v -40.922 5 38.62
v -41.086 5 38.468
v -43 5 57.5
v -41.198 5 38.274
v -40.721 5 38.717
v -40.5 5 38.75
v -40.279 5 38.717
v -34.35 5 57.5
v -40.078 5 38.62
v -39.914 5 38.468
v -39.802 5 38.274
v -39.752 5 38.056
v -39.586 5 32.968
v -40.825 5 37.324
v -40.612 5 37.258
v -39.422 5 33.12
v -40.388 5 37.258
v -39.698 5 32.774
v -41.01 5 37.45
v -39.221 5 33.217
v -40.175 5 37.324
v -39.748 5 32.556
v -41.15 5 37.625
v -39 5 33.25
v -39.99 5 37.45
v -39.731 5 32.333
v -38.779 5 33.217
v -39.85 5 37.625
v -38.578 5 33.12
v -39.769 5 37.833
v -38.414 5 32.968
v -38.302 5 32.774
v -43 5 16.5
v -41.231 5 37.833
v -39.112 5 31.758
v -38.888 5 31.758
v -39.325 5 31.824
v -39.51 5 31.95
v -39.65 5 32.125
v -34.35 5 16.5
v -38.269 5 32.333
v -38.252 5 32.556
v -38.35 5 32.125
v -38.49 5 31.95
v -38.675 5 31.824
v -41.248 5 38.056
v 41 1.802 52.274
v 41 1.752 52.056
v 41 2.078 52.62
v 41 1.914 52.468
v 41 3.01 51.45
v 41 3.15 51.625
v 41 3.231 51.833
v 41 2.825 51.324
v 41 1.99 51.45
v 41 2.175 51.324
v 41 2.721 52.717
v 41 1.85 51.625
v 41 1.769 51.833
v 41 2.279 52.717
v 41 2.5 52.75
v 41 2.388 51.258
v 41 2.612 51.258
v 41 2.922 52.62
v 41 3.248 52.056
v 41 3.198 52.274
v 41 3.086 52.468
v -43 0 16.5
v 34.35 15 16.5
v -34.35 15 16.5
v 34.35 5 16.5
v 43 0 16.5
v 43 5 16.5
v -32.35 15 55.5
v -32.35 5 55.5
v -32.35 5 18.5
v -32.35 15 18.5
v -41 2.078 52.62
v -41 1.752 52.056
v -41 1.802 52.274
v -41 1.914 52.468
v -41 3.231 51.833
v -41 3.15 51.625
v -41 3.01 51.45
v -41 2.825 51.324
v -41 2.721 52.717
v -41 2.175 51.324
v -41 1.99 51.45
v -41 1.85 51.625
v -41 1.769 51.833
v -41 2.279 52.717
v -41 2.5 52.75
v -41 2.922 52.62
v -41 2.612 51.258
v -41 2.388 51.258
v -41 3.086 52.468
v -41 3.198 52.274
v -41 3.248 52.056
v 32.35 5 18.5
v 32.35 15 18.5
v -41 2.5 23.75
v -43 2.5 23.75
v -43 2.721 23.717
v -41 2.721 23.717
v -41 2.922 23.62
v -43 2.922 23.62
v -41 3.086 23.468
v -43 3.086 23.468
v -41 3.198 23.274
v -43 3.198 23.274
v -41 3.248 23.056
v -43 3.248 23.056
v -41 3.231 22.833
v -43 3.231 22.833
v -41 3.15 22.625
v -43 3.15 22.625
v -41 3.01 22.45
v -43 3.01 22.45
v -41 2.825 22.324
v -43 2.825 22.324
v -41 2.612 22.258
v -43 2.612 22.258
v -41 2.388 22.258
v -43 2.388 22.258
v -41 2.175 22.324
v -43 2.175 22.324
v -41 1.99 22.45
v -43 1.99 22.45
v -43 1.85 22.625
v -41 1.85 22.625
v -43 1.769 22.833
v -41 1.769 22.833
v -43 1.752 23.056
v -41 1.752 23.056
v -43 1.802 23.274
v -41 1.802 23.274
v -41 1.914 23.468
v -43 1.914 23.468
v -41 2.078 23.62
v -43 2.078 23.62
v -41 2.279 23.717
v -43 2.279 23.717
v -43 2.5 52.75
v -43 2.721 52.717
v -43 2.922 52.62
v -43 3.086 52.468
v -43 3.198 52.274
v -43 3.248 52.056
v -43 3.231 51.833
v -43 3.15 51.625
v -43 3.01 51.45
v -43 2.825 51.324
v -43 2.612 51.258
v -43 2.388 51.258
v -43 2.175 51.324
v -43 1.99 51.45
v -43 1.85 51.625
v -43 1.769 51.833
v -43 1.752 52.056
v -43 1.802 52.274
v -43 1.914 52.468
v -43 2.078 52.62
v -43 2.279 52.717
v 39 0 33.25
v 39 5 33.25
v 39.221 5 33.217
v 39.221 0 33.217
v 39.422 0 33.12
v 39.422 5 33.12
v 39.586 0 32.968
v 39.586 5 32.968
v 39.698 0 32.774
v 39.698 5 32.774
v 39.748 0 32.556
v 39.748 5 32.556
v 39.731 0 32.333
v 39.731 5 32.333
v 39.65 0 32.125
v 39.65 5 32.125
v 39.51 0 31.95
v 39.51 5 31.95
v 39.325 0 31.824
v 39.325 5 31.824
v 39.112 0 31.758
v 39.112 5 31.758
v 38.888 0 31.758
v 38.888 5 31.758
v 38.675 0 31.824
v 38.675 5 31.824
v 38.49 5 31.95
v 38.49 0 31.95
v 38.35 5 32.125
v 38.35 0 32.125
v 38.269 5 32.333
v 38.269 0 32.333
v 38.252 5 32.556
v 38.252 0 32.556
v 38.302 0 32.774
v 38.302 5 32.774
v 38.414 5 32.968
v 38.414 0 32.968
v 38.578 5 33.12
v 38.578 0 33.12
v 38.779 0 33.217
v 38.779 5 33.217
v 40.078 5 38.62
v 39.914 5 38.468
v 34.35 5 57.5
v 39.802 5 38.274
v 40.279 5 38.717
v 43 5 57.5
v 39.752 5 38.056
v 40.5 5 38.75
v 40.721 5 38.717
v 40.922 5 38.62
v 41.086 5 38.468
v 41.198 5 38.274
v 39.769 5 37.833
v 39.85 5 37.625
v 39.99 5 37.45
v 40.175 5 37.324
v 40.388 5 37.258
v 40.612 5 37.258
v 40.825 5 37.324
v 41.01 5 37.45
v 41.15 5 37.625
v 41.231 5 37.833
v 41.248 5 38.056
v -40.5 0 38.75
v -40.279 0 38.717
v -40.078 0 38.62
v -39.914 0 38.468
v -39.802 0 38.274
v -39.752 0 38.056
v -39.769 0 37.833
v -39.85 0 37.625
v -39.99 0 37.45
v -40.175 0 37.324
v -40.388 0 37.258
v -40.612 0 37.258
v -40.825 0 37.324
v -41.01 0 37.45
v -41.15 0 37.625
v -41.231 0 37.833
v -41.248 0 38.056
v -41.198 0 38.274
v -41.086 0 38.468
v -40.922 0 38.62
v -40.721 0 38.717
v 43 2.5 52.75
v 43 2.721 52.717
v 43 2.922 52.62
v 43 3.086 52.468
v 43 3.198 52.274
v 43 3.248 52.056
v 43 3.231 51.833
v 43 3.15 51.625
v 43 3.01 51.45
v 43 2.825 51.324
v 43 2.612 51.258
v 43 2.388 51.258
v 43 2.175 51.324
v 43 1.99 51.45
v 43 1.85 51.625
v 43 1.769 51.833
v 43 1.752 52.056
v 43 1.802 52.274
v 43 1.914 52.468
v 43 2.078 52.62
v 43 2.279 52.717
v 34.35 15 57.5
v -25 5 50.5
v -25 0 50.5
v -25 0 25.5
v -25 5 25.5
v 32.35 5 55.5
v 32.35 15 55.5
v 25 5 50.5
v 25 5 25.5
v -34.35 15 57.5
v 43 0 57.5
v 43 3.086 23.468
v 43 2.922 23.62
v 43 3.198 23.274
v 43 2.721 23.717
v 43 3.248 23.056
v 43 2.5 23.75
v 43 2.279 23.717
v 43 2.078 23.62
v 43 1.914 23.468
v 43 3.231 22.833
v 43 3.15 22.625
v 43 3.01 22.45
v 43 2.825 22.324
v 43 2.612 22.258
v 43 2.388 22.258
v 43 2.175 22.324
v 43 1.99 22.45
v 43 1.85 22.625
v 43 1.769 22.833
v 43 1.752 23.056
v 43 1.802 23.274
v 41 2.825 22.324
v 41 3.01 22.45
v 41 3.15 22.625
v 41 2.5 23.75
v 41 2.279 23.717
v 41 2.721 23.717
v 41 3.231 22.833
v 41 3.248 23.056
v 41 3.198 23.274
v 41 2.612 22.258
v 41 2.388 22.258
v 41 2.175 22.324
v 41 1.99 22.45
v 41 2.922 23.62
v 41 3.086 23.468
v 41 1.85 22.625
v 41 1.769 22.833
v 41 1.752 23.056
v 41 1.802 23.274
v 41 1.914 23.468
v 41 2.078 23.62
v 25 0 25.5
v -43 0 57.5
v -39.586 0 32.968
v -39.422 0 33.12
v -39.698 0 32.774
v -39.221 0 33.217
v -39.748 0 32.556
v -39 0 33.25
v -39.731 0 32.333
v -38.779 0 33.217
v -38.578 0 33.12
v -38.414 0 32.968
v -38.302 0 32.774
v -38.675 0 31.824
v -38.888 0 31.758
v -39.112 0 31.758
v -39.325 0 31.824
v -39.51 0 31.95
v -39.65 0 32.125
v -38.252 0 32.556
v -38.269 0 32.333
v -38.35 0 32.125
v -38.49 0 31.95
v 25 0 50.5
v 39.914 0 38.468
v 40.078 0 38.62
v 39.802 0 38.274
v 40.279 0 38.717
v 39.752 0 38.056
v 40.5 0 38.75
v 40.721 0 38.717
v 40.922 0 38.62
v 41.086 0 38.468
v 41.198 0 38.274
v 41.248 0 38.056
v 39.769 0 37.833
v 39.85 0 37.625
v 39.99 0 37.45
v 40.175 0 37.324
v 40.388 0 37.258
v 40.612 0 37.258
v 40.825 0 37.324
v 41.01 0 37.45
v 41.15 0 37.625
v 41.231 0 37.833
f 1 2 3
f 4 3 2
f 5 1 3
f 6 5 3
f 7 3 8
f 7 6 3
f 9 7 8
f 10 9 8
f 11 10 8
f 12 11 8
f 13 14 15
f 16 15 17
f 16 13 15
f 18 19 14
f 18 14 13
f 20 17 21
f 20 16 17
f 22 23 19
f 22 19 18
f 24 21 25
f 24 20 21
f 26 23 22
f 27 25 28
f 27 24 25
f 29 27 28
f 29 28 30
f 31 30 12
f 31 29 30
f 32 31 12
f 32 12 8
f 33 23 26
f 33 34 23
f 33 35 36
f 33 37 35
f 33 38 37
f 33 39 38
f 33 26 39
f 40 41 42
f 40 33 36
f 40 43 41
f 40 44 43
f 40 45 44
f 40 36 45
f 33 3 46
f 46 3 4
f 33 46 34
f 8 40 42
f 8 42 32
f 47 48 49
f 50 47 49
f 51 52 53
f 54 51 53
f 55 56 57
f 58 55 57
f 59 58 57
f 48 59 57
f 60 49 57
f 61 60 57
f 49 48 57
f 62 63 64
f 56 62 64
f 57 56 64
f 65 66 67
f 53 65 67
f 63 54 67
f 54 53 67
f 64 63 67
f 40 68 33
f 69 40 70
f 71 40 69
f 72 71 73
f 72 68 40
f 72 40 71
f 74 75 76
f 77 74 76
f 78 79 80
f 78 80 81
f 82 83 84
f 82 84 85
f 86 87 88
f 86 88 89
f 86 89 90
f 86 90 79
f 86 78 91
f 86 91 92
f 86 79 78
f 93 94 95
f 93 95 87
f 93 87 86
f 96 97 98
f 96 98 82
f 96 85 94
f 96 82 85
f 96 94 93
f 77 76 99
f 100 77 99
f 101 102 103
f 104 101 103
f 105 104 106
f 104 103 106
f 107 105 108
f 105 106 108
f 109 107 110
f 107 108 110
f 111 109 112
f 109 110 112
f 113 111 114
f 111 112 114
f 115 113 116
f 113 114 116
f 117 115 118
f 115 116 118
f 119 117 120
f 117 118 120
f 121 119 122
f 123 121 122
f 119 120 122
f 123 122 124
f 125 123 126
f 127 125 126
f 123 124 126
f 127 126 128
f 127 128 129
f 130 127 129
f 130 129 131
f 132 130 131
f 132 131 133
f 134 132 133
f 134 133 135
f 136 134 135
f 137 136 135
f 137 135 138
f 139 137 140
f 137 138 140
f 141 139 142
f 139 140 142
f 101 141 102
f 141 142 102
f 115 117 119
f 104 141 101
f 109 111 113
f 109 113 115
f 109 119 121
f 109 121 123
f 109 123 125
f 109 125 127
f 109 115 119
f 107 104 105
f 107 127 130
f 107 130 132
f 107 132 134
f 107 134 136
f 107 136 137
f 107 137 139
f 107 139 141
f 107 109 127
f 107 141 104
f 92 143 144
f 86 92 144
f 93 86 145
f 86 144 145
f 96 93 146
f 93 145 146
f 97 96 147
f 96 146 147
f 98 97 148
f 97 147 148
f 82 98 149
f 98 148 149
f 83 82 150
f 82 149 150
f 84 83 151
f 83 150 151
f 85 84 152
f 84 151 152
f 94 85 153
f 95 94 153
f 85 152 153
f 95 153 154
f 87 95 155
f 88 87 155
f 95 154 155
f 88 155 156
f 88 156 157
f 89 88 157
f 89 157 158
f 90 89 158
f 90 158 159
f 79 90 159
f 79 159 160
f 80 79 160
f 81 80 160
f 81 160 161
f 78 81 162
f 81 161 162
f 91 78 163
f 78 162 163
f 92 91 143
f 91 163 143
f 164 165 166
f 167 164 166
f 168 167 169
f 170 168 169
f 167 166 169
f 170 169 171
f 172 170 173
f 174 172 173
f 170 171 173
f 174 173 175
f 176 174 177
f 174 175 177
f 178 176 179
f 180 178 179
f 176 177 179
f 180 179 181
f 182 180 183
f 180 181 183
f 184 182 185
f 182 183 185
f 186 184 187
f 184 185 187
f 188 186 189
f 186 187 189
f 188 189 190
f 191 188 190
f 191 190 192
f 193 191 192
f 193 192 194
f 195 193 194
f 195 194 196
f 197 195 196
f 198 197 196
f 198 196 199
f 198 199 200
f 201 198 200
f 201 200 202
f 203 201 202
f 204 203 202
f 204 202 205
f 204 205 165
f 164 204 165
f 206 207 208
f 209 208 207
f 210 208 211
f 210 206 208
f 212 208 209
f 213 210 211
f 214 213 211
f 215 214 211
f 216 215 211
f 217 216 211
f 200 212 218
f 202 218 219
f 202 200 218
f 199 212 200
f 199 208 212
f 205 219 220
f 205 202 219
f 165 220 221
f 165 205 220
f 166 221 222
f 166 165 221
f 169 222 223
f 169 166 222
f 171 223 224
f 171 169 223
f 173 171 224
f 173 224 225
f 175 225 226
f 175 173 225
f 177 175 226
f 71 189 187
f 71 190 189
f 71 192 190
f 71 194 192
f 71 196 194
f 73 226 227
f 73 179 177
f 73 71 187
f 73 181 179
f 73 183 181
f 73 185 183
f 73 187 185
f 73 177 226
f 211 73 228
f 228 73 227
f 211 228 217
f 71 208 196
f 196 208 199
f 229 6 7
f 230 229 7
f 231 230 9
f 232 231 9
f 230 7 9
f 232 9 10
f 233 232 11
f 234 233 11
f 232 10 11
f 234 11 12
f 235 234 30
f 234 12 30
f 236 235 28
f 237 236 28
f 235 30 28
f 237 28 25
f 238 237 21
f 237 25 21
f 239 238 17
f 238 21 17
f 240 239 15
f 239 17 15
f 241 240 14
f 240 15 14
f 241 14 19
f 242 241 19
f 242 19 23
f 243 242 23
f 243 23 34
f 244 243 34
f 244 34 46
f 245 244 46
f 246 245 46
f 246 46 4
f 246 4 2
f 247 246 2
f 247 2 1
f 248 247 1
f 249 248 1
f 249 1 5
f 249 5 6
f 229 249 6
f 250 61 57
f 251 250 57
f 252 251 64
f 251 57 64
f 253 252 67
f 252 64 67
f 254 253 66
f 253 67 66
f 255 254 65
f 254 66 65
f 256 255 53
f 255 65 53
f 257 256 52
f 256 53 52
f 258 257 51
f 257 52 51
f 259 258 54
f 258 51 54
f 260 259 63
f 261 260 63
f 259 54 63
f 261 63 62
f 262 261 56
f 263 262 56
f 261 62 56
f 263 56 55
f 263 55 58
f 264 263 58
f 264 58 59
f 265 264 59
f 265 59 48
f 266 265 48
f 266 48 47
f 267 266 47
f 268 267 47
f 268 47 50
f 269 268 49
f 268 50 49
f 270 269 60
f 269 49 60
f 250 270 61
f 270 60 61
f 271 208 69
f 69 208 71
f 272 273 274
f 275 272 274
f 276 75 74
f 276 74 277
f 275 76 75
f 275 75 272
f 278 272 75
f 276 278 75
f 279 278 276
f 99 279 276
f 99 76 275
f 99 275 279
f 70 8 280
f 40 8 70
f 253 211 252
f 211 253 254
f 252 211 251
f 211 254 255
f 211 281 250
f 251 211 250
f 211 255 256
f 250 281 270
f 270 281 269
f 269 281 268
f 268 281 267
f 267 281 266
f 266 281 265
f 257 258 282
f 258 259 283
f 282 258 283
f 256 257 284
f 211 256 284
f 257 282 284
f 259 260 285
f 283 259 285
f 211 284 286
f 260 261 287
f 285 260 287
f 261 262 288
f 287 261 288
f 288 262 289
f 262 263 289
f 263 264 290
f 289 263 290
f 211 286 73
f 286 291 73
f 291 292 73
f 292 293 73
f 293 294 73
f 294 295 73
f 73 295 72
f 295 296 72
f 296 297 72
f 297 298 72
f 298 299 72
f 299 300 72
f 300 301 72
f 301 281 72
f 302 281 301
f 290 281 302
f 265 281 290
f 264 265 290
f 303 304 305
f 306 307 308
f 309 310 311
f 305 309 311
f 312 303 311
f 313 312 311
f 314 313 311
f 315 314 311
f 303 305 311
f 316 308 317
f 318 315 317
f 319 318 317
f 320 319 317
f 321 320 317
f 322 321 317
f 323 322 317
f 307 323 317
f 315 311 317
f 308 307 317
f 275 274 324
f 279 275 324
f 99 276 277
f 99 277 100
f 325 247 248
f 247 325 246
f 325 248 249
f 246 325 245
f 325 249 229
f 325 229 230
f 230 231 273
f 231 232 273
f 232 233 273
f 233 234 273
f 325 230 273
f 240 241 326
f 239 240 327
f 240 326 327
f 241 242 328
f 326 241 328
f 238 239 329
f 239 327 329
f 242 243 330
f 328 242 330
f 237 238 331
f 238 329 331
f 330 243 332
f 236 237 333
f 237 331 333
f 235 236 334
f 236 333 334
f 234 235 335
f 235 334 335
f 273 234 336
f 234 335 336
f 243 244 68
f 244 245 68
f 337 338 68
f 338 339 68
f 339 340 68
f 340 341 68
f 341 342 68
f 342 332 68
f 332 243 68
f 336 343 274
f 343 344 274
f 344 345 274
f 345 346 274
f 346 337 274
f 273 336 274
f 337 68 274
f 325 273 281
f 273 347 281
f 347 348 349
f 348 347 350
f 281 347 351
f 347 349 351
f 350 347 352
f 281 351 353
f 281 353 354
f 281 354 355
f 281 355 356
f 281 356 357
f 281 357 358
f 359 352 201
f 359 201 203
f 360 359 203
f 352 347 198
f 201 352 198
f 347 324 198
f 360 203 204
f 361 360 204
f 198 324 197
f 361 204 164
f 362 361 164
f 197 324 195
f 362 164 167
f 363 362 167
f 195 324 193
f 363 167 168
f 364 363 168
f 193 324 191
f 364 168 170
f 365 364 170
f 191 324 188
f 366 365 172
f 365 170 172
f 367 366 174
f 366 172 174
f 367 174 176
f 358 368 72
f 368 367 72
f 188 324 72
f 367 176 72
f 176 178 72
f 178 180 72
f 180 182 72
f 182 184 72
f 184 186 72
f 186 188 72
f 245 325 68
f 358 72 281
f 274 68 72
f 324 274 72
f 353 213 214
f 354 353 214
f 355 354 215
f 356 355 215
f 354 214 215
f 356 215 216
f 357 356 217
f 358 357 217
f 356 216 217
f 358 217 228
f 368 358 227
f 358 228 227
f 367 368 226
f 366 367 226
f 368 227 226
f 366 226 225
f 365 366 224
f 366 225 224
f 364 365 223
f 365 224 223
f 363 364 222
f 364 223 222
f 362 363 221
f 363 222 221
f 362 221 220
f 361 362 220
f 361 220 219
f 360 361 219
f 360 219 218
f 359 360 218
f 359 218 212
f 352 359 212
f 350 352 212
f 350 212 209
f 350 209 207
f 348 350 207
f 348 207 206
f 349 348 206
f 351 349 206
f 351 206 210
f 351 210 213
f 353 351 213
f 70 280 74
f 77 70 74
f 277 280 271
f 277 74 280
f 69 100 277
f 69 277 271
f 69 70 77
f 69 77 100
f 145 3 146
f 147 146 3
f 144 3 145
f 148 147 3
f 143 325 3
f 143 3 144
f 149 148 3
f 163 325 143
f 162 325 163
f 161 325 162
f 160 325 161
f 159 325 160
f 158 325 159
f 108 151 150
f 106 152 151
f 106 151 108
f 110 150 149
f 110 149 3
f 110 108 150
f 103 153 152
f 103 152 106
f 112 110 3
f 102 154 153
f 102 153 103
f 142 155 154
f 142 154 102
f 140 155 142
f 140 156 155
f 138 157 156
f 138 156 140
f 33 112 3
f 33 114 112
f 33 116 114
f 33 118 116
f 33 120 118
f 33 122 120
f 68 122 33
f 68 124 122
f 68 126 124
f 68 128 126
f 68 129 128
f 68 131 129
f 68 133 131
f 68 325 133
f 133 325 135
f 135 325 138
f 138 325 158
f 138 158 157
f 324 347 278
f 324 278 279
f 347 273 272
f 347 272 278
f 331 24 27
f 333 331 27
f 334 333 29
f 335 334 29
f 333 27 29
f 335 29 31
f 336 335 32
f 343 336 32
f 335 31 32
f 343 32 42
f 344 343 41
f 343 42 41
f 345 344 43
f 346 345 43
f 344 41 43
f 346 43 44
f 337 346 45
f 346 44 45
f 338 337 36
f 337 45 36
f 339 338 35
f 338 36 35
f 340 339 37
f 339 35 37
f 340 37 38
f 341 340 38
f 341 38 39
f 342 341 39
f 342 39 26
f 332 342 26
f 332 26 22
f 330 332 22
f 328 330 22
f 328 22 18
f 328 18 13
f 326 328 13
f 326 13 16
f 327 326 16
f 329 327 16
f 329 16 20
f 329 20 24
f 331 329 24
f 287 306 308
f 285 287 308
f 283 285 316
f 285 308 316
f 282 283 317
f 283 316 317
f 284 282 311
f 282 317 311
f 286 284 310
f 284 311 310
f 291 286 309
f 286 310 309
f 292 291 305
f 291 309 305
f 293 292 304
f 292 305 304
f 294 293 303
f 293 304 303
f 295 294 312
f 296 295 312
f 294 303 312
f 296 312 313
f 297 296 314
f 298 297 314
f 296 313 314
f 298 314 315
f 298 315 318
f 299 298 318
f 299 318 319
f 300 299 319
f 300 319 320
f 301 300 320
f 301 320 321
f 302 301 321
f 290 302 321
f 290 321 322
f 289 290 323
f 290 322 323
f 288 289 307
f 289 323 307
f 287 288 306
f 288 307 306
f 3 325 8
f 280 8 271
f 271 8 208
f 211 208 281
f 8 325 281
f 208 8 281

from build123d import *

# Parameters (mm, degrees)
SKETCH_1_W          = 86
SKETCH_1_H          = 174
SKETCH_1_W_2        = 50
SKETCH_1_H_2        = 25
SKETCH_1_H_3        = 55
SKETCH_1_W_3        = 76
SKETCH_1_H_4        = 43
EXTRUDE_1_DEPTH     = 5
SKETCH_4_W          = 68.7
SKETCH_4_H          = 115
SKETCH_4_W_2        = 64.7
SKETCH_4_H_2        = 37
SKETCH_4_H_3        = 70
EXTRUDE_2_DEPTH     = 10
SKETCH_5_R          = 0.75
CUT_EXTRUDE_1_DEPTH = 122.783619588
SKETCH_7_W          = 15
SKETCH_7_H          = 8
SKETCH_7_W_2        = 26
SKETCH_7_W_3        = 5
SKETCH_7_H_2        = 10
SKETCH_7_H_3        = 12.119700025
SKETCH_7_W_4        = 6
SKETCH_7_H_4        = 5
SKETCH_7_W_5        = 7
SKETCH_7_H_5        = 21
CUT_EXTRUDE_2_DEPTH = 2
SKETCH_8_R          = 0.75
CUT_EXTRUDE_3_DEPTH = 2
CUT_EXTRUDE_START   = -84
SKETCH_8_3_R        = 0.75
CUT_EXTRUDE_4_DEPTH = 2
SKETCH_9_R          = 0.75
SKETCH_9_W          = 50
SKETCH_9_H          = 55
SKETCH_9_W_2        = 86
SKETCH_9_H_2        = 56
SKETCH_9_W_3        = 76
SKETCH_9_H_3        = 43
CUT_EXTRUDE_5_DEPTH = 123.295748086


with BuildPart() as part:
    # 草图1 → 凸台-拉伸1 (new body)
    with BuildSketch(Plane(origin=(0, 0, 0), x_dir=(1, 0, 0), z_dir=(0, 1, 0))):
        with Locations((0, -26.5)):
            Rectangle(SKETCH_1_W, SKETCH_1_H)
        with Locations((0, -38)):
            Rectangle(SKETCH_1_W_2, SKETCH_1_H_2, mode=Mode.SUBTRACT)
        with Locations((0, 23)):
            Rectangle(SKETCH_1_W_2, SKETCH_1_H_3, mode=Mode.SUBTRACT)
        with Locations((0, -87)):
            Rectangle(SKETCH_1_W_3, SKETCH_1_H_4, mode=Mode.SUBTRACT)
    extrude(amount=EXTRUDE_1_DEPTH)

    # 草图4 → 凸台-拉伸2 (add)
    with BuildSketch(Plane(origin=(0, 5, 0), x_dir=(1, 0, 0), z_dir=(0, 1, 0))):
        Rectangle(SKETCH_4_W, SKETCH_4_H)
        with Locations((0, -37)):
            Rectangle(SKETCH_4_W_2, SKETCH_4_H_2, mode=Mode.SUBTRACT)
        with Locations((0, 20.5)):
            Rectangle(SKETCH_4_W_2, SKETCH_4_H_3, mode=Mode.SUBTRACT)
    extrude(amount=EXTRUDE_2_DEPTH)

    # 草图5 → 切除-拉伸1 (cut, through all)
    with BuildSketch(Plane(origin=(0, 5, 0), x_dir=(1, 0, 0), z_dir=(0, 1, 0))):
        with Locations(Location((-39, 20.5, 0), (0, 0, 270))):
            Circle(SKETCH_5_R)
        with Locations(Location((39, 20.5, 0), (0, 0, 270))):
            Circle(SKETCH_5_R)
        with Locations(Location((-39, -32.5, 0), (0, 0, 270))):
            Circle(SKETCH_5_R)
        with Locations(Location((39, -32.5, 0), (0, 0, 270))):
            Circle(SKETCH_5_R)
        with Locations(Location((-40.1427775, -60.35, 0), (0, 0, 270))):
            Circle(SKETCH_5_R)
        with Locations(Location((40.1427775, -60.35, 0), (0, 0, 270))):
            Circle(SKETCH_5_R)
        with Locations(Location((-40.1427775, -110.530299975, 0), (0, 0, 270))):
            Circle(SKETCH_5_R)
        with Locations(Location((40.1427775, -110.530299975, 0), (0, 0, 270))):
            Circle(SKETCH_5_R)
        with Locations(Location((-40.5, 57.5, 0), (0, 0, 270))):
            Circle(SKETCH_5_R)
        with Locations(Location((-40.5, -38, 0), (0, 0, 270))):
            Circle(SKETCH_5_R)
        with Locations(Location((-40.5, -85.5, 0), (0, 0, 270))):
            Circle(SKETCH_5_R)
        with Locations(Location((40.5, 57.5, 0), (0, 0, 270))):
            Circle(SKETCH_5_R)
        with Locations(Location((40.5, -38, 0), (0, 0, 270))):
            Circle(SKETCH_5_R)
        with Locations(Location((40.5, -85.5, 0), (0, 0, 270))):
            Circle(SKETCH_5_R)
        with Locations(Location((-40.5, -4.5, 0), (0, 0, 270))):
            Circle(SKETCH_5_R)
        with Locations(Location((40.5, -4.5, 0), (0, 0, 270))):
            Circle(SKETCH_5_R)
    extrude(amount=-CUT_EXTRUDE_1_DEPTH, mode=Mode.SUBTRACT)

    # 草图7 → 切除-拉伸2 (cut)
    with BuildSketch(Plane(origin=(0, 5, 0), x_dir=(1, 0, 0), z_dir=(0, 1, 0))):
        with Locations((-24.5, -61.5)):
            Rectangle(SKETCH_7_W, SKETCH_7_H)
        with Locations((0, -61.5)):
            Rectangle(SKETCH_7_W_2, SKETCH_7_H)
        with Locations((-40.5, -78.5)):
            Rectangle(SKETCH_7_W_3, SKETCH_7_H_2)
        with Locations((-40.5, -101.440149988)):
            Rectangle(SKETCH_7_W_3, SKETCH_7_H_3)
        with Locations((-32, -111)):
            Rectangle(SKETCH_7_W_4, SKETCH_7_H_4)
        with Locations((-3, -111)):
            Rectangle(SKETCH_7_W_4, SKETCH_7_H_4)
        with Locations((17.5, -111)):
            Rectangle(SKETCH_7_W_5, SKETCH_7_H_4)
        with Locations((30.5, -111)):
            Rectangle(SKETCH_7_W_5, SKETCH_7_H_4)
        with Locations((40.5, -92)):
            Rectangle(SKETCH_7_W_3, SKETCH_7_H_5)
    extrude(amount=-CUT_EXTRUDE_2_DEPTH, mode=Mode.SUBTRACT)

    # 草图8 → 切除-拉伸3 (cut)
    with BuildSketch(Plane.ZY.offset(43)):
        with Locations((8, 2.5)):
            Circle(SKETCH_8_R)
        with Locations((23, 2.5)):
            Circle(SKETCH_8_R)
        with Locations((52, 2.5)):
            Circle(SKETCH_8_R)
        with Locations((63, 2.5)):
            Circle(SKETCH_8_R)
    extrude(amount=-CUT_EXTRUDE_3_DEPTH, mode=Mode.SUBTRACT)

    # 草图8<3> → 切除-拉伸4 (cut)
    with BuildSketch(Plane.ZY.offset(43).offset(CUT_EXTRUDE_START)):
        with Locations((8, 2.5)):
            Circle(SKETCH_8_3_R)
        with Locations((23, 2.5)):
            Circle(SKETCH_8_3_R)
        with Locations((52, 2.5)):
            Circle(SKETCH_8_3_R)
        with Locations((63, 2.5)):
            Circle(SKETCH_8_3_R)
    extrude(amount=-CUT_EXTRUDE_4_DEPTH, mode=Mode.SUBTRACT)

    # 草图9 → 切除-拉伸5 (cut, through all)
    # profile 1 of 2: a face of its own
    with BuildSketch(Plane(origin=(0, 0, 0), x_dir=(1, 0, 0), z_dir=(0, 1, 0))):
        Polygon((-43, 60.5), (-43, -16.5), (0, -16.5), (43, -16.5), (43, 60.5), align=None)
        with Locations((-40.5, -4.5)):
            Circle(SKETCH_9_R, mode=Mode.SUBTRACT)
        with Locations((-39, 20.5)):
            Circle(SKETCH_9_R, mode=Mode.SUBTRACT)
        with Locations((-40.5, 57.5)):
            Circle(SKETCH_9_R, mode=Mode.SUBTRACT)
        with Locations((0, 23)):
            Rectangle(SKETCH_9_W, SKETCH_9_H, mode=Mode.SUBTRACT)
        with Locations((40.5, -4.5)):
            Circle(SKETCH_9_R, mode=Mode.SUBTRACT)
        with Locations((39, 20.5)):
            Circle(SKETCH_9_R, mode=Mode.SUBTRACT)
        with Locations((40.5, 57.5)):
            Circle(SKETCH_9_R, mode=Mode.SUBTRACT)
    # profile 2 of 2: a face of its own
    with BuildSketch(Plane(origin=(0, 0, 0), x_dir=(1, 0, 0), z_dir=(0, 1, 0))):
        with Locations((0, -85.5)):
            Rectangle(SKETCH_9_W_2, SKETCH_9_H_2)
        with Locations((-40.1427775, -110.530299975)):
            Circle(SKETCH_9_R, mode=Mode.SUBTRACT)
        with Locations((-40.5, -85.5)):
            Circle(SKETCH_9_R, mode=Mode.SUBTRACT)
        with Locations((0, -87)):
            Rectangle(SKETCH_9_W_3, SKETCH_9_H_3, mode=Mode.SUBTRACT)
        with Locations((-40.1427775, -60.35)):
            Circle(SKETCH_9_R, mode=Mode.SUBTRACT)
        with Locations((40.1427775, -110.530299975)):
            Circle(SKETCH_9_R, mode=Mode.SUBTRACT)
        with Locations((40.5, -85.5)):
            Circle(SKETCH_9_R, mode=Mode.SUBTRACT)
        with Locations((40.1427775, -60.35)):
            Circle(SKETCH_9_R, mode=Mode.SUBTRACT)
    extrude(amount=CUT_EXTRUDE_5_DEPTH, mode=Mode.SUBTRACT)


solid = part.part
